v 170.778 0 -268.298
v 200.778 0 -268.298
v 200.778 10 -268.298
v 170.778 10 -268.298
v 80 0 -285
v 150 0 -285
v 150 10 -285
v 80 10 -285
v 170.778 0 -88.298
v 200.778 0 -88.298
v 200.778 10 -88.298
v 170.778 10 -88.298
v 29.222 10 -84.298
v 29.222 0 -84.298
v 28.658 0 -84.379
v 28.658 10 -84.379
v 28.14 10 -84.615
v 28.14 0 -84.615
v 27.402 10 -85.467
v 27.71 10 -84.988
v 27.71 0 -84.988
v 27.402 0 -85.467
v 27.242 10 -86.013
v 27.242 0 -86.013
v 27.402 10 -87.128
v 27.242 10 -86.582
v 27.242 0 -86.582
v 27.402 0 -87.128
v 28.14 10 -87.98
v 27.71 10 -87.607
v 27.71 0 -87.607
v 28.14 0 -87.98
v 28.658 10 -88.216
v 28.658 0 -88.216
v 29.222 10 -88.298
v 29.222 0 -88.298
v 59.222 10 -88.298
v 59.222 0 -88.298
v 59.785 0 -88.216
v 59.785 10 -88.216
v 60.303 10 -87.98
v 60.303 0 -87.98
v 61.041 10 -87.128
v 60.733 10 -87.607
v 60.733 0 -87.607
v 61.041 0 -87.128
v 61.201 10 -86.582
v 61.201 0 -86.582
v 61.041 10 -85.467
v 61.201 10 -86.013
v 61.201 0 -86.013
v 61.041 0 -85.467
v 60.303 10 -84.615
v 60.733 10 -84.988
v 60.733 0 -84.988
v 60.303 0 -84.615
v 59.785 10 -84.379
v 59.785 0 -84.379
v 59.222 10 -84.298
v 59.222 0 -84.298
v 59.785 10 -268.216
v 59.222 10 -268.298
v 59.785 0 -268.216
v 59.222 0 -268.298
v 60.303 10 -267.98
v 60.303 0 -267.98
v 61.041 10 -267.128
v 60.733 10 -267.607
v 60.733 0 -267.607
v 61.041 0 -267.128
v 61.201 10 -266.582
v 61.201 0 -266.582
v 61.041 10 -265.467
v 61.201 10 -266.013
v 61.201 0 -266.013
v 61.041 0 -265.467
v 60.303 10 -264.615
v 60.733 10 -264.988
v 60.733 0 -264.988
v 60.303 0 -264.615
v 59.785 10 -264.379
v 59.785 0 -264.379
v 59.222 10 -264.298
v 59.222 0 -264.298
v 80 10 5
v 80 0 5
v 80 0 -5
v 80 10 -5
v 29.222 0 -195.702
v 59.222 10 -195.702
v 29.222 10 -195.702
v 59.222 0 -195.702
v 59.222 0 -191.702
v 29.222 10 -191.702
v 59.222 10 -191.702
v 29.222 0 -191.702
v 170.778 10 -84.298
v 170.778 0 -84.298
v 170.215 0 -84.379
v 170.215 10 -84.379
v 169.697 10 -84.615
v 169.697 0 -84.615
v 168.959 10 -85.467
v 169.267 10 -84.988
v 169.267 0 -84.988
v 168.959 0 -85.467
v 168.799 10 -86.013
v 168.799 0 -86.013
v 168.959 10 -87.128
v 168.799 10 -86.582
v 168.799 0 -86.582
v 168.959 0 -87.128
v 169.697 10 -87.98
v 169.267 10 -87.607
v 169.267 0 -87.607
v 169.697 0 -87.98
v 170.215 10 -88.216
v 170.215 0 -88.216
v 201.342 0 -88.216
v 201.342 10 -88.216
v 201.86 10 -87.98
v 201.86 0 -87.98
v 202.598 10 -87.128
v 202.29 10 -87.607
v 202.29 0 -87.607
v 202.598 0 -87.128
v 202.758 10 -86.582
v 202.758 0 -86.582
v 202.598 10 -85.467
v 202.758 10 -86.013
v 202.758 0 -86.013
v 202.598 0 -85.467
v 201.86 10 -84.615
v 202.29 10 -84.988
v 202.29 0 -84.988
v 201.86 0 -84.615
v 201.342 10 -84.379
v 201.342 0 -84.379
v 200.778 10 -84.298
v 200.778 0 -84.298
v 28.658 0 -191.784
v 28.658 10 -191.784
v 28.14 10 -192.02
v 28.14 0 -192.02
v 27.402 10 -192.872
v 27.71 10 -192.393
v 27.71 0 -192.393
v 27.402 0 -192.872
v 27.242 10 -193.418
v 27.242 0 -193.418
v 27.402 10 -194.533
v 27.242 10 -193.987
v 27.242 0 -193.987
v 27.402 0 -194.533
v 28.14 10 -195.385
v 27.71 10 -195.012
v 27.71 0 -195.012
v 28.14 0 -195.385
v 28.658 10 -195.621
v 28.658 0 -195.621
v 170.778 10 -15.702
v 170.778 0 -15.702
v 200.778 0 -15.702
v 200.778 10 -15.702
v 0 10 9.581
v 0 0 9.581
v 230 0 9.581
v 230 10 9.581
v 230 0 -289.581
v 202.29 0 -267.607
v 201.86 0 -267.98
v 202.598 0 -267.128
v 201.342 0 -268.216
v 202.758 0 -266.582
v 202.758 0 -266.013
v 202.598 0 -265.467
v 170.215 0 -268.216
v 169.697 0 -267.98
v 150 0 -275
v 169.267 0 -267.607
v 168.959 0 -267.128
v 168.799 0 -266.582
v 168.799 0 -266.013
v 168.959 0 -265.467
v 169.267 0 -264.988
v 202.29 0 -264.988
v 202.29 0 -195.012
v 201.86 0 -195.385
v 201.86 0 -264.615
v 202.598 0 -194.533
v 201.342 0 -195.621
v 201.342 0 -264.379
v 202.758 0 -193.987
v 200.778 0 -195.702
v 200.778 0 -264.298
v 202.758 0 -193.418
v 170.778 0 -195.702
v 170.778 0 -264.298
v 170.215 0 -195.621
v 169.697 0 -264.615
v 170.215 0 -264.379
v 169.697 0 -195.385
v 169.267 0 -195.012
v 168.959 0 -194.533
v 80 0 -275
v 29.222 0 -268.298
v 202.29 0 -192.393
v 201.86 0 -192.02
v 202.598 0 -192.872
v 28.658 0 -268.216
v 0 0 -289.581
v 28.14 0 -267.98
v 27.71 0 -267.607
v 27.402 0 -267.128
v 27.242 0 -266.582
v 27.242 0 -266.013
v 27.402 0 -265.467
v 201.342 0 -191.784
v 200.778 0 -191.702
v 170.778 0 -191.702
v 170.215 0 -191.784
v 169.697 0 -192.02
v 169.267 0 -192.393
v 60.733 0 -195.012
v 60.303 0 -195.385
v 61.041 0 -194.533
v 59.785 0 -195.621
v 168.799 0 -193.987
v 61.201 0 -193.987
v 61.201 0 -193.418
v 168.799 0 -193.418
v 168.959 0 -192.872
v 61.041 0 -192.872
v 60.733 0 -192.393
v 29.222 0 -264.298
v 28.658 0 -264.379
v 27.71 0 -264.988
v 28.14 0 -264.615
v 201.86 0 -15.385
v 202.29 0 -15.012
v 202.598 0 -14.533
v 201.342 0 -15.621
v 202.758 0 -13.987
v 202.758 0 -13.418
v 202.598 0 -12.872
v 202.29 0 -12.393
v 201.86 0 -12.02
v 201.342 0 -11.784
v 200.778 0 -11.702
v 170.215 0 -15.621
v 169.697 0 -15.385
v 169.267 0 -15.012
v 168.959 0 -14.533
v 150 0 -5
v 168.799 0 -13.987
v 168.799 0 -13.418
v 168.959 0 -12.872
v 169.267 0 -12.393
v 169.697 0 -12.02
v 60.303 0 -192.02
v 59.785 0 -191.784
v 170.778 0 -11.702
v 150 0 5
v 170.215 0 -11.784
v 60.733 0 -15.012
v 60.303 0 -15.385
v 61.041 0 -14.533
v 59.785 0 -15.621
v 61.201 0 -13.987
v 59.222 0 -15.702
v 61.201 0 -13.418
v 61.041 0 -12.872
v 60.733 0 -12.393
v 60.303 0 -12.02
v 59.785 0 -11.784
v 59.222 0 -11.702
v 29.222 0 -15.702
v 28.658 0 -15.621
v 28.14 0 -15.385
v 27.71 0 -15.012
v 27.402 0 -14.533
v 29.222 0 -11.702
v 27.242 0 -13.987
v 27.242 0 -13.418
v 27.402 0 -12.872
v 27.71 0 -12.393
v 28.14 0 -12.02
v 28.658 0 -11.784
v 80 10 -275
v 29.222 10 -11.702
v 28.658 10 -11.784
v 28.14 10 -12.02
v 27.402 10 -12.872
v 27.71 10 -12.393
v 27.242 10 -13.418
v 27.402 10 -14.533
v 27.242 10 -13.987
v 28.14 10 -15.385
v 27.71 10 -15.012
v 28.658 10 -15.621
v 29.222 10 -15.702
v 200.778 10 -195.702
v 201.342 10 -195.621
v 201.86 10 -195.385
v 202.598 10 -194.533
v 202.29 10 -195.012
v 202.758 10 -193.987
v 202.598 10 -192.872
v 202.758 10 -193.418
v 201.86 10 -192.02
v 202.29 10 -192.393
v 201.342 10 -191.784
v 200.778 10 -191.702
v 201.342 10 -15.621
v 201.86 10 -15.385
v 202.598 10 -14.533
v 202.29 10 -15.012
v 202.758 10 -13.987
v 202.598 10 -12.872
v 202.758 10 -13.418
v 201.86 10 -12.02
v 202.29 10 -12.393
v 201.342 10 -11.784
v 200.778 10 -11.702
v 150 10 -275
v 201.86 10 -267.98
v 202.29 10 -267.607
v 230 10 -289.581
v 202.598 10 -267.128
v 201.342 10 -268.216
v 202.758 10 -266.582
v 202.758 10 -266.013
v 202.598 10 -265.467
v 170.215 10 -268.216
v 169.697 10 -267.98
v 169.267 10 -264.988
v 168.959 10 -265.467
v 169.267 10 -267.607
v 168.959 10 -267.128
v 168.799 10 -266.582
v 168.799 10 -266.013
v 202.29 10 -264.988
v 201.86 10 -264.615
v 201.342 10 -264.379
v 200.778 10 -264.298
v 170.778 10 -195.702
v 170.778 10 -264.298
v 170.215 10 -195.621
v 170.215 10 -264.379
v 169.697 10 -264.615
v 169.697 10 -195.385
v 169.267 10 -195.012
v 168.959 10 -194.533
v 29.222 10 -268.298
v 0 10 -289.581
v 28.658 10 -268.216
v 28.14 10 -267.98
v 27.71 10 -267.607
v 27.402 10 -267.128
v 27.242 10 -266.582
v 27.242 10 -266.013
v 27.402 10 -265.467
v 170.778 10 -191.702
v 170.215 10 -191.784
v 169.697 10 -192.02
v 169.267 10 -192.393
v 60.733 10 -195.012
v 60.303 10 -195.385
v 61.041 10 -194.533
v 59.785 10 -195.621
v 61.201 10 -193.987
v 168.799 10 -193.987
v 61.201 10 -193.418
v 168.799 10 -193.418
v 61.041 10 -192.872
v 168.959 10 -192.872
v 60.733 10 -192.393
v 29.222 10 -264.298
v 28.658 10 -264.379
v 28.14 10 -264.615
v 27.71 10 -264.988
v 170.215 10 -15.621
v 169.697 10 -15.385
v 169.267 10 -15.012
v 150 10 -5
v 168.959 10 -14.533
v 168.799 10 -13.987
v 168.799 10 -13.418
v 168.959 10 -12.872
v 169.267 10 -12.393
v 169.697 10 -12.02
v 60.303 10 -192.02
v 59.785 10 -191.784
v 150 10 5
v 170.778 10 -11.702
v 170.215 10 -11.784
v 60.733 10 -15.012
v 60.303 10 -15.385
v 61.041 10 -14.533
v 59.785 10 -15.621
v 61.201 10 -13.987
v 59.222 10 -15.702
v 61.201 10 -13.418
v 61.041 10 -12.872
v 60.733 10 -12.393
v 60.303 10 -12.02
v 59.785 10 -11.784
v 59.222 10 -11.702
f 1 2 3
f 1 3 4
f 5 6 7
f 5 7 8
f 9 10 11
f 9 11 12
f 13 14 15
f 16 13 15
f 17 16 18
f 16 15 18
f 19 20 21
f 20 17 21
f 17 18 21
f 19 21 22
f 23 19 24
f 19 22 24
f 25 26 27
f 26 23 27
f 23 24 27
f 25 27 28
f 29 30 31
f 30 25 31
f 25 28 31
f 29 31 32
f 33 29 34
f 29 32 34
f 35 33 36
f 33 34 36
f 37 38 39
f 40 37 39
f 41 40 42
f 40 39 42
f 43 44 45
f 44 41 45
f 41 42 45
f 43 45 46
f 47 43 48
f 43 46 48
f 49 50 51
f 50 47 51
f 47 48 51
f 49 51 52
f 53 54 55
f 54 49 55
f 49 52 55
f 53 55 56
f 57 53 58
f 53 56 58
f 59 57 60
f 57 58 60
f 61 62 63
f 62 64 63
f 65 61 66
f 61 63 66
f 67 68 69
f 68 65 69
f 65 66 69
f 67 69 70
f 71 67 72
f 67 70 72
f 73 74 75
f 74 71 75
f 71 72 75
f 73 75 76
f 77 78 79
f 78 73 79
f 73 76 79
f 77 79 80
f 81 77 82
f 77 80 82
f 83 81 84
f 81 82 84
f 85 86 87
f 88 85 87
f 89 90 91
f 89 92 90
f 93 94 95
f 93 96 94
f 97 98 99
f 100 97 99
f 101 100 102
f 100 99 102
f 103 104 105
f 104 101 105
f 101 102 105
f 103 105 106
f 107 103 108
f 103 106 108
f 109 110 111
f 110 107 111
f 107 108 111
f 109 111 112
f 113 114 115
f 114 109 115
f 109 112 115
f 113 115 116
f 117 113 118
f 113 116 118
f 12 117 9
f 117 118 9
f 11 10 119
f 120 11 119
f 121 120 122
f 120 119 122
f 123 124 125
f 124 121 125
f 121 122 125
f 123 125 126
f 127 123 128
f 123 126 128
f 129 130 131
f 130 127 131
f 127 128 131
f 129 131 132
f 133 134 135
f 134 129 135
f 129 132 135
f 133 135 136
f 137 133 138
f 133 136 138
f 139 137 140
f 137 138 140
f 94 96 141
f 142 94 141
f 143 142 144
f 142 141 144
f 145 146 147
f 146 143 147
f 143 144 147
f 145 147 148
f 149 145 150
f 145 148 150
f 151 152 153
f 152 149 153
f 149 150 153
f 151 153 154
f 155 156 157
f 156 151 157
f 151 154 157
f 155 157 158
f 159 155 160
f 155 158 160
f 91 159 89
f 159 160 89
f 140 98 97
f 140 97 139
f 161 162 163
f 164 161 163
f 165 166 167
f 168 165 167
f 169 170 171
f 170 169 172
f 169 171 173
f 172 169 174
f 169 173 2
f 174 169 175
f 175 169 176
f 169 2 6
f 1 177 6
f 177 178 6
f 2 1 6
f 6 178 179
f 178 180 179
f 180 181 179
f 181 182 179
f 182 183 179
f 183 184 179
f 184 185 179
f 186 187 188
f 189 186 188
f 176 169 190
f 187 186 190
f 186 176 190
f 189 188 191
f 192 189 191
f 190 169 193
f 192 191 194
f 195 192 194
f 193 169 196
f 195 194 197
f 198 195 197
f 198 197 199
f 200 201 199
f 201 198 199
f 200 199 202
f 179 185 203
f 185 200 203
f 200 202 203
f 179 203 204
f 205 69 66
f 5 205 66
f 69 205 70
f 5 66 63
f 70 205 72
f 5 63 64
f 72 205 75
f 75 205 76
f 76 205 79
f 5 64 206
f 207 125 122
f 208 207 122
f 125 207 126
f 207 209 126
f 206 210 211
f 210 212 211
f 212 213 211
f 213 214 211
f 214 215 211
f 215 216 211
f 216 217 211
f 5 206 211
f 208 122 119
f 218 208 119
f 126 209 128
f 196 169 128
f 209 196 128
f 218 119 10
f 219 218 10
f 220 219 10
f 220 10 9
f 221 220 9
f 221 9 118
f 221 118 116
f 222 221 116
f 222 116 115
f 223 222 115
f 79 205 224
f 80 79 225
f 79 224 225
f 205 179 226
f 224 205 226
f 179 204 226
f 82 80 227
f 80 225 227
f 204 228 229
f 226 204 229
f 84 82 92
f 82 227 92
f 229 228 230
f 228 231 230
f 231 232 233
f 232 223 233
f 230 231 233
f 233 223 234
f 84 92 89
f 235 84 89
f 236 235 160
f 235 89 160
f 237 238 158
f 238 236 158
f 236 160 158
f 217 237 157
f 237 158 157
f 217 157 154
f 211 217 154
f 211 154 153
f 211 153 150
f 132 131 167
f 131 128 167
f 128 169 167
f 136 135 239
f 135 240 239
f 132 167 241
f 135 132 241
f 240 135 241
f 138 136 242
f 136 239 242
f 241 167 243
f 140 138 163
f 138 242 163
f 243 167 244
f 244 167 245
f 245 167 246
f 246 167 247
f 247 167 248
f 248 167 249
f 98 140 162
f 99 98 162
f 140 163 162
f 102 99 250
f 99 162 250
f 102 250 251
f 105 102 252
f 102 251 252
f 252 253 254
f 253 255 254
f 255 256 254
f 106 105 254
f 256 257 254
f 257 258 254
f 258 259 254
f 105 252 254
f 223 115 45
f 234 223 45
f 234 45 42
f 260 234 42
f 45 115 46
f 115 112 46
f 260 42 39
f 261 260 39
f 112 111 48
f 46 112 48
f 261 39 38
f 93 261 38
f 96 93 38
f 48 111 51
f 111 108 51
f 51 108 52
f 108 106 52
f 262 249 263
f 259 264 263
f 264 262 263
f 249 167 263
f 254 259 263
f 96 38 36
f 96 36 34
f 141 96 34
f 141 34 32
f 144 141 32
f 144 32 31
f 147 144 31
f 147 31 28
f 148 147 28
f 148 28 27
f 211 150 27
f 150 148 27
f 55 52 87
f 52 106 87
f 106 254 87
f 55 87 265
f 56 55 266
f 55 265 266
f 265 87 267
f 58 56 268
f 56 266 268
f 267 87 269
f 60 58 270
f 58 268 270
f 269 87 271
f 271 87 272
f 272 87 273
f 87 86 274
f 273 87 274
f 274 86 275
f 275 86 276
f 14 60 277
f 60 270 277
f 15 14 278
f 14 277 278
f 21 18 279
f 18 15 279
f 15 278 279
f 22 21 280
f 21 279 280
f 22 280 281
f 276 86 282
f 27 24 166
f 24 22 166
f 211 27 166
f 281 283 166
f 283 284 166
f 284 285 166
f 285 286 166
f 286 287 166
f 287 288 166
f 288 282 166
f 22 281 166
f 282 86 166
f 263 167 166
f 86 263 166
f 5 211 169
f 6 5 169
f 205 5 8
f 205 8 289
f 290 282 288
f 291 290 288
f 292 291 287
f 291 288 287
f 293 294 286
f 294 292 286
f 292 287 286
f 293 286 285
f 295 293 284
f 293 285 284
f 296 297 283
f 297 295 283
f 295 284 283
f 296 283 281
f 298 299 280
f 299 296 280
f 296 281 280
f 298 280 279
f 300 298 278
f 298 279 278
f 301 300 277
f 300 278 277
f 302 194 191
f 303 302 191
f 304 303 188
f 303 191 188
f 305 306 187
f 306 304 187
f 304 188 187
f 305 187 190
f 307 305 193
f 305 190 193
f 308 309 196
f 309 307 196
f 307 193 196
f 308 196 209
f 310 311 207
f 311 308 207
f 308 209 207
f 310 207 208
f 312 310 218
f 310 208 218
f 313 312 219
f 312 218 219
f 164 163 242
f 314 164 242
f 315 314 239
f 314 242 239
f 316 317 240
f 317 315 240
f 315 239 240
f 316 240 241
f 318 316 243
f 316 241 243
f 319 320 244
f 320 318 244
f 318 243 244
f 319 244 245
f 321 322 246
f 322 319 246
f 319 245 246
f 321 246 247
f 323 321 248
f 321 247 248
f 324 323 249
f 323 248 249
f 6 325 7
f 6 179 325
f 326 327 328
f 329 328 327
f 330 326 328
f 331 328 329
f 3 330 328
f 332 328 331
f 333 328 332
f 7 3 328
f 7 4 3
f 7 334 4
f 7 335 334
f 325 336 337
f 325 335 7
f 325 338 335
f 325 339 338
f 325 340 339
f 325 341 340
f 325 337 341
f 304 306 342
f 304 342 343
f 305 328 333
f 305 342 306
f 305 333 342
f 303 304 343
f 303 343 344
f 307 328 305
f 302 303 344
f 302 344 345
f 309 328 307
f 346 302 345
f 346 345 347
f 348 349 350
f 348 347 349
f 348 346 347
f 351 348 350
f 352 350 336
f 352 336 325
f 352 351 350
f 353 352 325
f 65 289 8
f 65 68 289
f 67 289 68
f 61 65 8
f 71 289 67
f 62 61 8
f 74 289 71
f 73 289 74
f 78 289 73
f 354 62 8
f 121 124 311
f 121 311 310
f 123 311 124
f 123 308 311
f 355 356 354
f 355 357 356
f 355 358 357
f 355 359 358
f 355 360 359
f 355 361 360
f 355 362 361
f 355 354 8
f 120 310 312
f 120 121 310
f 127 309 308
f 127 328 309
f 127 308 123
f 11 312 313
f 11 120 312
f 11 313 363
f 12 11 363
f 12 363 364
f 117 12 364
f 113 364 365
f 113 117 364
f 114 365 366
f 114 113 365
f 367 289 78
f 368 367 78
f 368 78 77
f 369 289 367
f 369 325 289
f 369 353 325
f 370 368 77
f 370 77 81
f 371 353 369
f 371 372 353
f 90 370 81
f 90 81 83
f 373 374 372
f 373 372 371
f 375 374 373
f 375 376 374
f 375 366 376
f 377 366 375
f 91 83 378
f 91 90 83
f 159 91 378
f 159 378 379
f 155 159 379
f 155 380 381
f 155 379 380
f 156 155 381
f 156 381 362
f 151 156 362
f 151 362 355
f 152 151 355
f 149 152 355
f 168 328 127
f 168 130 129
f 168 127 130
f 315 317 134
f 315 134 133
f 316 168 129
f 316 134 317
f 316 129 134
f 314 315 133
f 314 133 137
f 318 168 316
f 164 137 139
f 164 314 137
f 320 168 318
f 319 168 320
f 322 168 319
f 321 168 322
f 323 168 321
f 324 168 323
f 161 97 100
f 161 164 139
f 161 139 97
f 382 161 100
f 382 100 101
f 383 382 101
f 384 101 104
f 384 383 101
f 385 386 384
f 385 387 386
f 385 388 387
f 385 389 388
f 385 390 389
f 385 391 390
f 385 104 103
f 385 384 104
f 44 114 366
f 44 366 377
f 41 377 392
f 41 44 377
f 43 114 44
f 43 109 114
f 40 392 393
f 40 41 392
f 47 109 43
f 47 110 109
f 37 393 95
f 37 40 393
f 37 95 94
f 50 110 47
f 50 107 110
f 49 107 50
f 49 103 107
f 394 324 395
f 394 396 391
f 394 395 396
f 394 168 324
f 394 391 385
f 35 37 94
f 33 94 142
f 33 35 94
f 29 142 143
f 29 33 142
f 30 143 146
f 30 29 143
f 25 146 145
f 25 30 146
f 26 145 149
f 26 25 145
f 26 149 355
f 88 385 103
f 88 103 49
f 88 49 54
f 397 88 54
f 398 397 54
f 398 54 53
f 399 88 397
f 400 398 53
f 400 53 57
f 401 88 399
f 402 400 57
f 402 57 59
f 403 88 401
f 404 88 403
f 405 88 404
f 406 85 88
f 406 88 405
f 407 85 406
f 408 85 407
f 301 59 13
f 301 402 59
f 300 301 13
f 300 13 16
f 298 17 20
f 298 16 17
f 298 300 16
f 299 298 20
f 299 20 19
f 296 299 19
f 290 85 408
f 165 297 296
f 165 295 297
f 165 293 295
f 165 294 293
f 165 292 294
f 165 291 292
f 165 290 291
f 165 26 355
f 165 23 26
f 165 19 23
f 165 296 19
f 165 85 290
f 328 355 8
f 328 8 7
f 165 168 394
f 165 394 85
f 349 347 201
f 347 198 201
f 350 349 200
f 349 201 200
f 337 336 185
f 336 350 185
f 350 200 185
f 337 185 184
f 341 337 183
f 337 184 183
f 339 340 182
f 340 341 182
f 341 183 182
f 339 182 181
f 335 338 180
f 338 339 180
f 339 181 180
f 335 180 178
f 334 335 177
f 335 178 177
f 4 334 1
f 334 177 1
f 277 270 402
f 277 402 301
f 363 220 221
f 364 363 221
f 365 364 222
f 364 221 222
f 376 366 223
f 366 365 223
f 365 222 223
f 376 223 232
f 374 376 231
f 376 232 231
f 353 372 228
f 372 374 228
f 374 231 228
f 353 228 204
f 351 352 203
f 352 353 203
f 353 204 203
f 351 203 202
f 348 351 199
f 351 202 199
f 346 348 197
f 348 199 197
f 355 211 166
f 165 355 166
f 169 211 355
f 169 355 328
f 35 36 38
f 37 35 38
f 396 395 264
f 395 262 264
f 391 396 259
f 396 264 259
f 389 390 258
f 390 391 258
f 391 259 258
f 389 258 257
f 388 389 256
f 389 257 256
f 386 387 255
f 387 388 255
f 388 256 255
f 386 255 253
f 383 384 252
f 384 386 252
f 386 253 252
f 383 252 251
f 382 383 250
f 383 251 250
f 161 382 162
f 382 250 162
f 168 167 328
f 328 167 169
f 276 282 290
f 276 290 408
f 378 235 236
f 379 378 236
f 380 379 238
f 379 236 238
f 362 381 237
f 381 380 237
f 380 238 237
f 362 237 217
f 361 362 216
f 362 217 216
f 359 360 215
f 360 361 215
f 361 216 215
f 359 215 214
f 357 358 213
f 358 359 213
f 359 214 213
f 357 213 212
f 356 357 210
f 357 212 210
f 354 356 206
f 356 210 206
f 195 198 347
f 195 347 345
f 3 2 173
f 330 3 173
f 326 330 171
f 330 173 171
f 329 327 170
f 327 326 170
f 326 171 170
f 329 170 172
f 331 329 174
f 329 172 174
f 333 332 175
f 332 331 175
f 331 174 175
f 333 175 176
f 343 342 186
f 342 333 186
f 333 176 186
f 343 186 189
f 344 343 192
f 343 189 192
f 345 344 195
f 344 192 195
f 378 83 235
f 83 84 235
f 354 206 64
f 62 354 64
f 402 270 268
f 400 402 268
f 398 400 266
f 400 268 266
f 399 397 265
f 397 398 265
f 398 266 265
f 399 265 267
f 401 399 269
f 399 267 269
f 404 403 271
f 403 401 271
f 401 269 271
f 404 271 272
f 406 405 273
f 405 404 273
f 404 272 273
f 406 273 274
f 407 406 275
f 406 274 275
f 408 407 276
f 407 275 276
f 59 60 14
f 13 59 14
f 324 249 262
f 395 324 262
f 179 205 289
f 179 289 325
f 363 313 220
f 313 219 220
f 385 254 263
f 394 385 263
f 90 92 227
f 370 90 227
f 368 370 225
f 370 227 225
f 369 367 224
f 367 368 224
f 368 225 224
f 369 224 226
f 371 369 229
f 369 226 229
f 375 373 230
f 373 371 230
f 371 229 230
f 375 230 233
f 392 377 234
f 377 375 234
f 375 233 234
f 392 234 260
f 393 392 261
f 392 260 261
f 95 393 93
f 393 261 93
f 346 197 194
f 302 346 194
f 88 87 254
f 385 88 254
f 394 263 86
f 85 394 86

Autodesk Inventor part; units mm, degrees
ref_plane "YZ Plane" through (0, 0, 0) normal (1, 0, 0) x (0, 1, 0)
ref_plane "XZ Plane" through (0, 0, 0) normal (0, 1, 0) x (-1, 0, 0)
ref_plane "XY Plane" through (0, 0, 0) normal (0, 0, 1) x (1, 0, 0)
sketch "Sketch1" plane through (0, 0, 0) normal (0, 1, 0) x (-1, 0, 0)
  line L0 (-230, 0) -> (-230, -280)
  line L1 (0, -280) -> (0, 0)
  line L2 (-115, 0) -> (-115, -280) construction
  line L3 (-230, -140) -> (0, -140) construction
  line L4 (0, -230) -> (-230, -230) construction
  line L5 (0, -28.043) -> (0, -96.333) construction
  line L6 (0, -69) -> (0, -31) construction
  line L7 (0, -50) -> (-230, -50) construction
  line L8 (0, -31) -> (-80, -31) construction
  line L9 (-80, -31) -> (-80, -69) construction
  line L10 (-80, -69) -> (0, -69) construction
  line L11 (0, -69) -> (0, -31)
  line L12 (-40, -50) -> (-40, -10.0475) construction
  line L13 (-40, -13.7025) -> (-29.2216, -13.7025)
  line L14 (-40, -13.7025) -> (-59.2216, -13.7025)
  line L15 (-29.2216, -13.7025) -> (-59.2216, -13.7025) construction
  line L16 (-29.2216, -11.7025) -> (-59.2216, -11.7025)
  line L17 (-59.2216, -15.7025) -> (-29.2216, -15.7025)
  arc A0 (-29.2216, -15.7025) -> (-29.2216, -11.7025) centre (-29.2216, -13.7025) ccw
  arc A1 (-59.2216, -11.7025) -> (-59.2216, -15.7025) centre (-59.2216, -13.7025) ccw
  line L18 (-40, -86.2975) -> (-29.2216, -86.2975)
  line L19 (-40, -86.2975) -> (-59.2216, -86.2975)
  line L20 (-29.2216, -86.2975) -> (-59.2216, -86.2975) construction
  line L21 (-29.2216, -88.2975) -> (-59.2216, -88.2975)
  line L22 (-59.2216, -84.2975) -> (-29.2216, -84.2975)
  arc A2 (-29.2216, -88.2975) -> (-29.2216, -84.2975) centre (-29.2216, -86.2975) ccw
  arc A3 (-59.2216, -84.2975) -> (-59.2216, -88.2975) centre (-59.2216, -86.2975) ccw
  line L23 (-230, -31) -> (-150, -31) construction
  line L24 (-150, -31) -> (-150, -69) construction
  line L25 (-150, -69) -> (-230, -69) construction
  line L26 (-190, -13.7025) -> (-200.7784, -13.7025)
  line L27 (-190, -13.7025) -> (-170.7784, -13.7025)
  line L28 (-200.7784, -13.7025) -> (-170.7784, -13.7025) construction
  line L29 (-200.7784, -11.7025) -> (-170.7784, -11.7025)
  line L30 (-170.7784, -15.7025) -> (-200.7784, -15.7025)
  arc A4 (-200.7784, -11.7025) -> (-200.7784, -15.7025) centre (-200.7784, -13.7025) ccw
  arc A5 (-170.7784, -15.7025) -> (-170.7784, -11.7025) centre (-170.7784, -13.7025) ccw
  arc A6 (-170.7784, -88.2975) -> (-170.7784, -84.2975) centre (-170.7784, -86.2975) ccw
  line L31 (-190, -86.2975) -> (-170.7784, -86.2975)
  line L32 (-170.7784, -84.2975) -> (-200.7784, -84.2975)
  line L33 (-190, -86.2975) -> (-200.7784, -86.2975)
  line L34 (-200.7784, -86.2975) -> (-170.7784, -86.2975) construction
  line L35 (-200.7784, -88.2975) -> (-170.7784, -88.2975)
  arc A7 (-200.7784, -84.2975) -> (-200.7784, -88.2975) centre (-200.7784, -86.2975) ccw
  line L36 (-115, -280) -> (-115, 0) construction
  line L37 (0, -230) -> (-230, -230) construction
  line L38 (0, -249) -> (-80, -249) construction
  line L39 (-80, -249) -> (-80, -211) construction
  line L40 (-80, -211) -> (0, -211) construction
  line L41 (-40, -230) -> (-40, -269.9525) construction
  line L42 (-40, -266.2975) -> (-29.2216, -266.2975)
  line L43 (-40, -266.2975) -> (-59.2216, -266.2975)
  line L44 (-29.2216, -266.2975) -> (-59.2216, -266.2975) construction
  line L45 (-29.2216, -268.2975) -> (-59.2216, -268.2975)
  line L46 (-59.2216, -264.2975) -> (-29.2216, -264.2975)
  arc A8 (-29.2216, -268.2975) -> (-29.2216, -264.2975) centre (-29.2216, -266.2975) ccw
  arc A9 (-59.2216, -264.2975) -> (-59.2216, -268.2975) centre (-59.2216, -266.2975) ccw
  arc A10 (-59.2216, -191.7025) -> (-59.2216, -195.7025) centre (-59.2216, -193.7025) ccw
  line L47 (-40, -193.7025) -> (-59.2216, -193.7025)
  line L48 (-59.2216, -195.7025) -> (-29.2216, -195.7025)
  line L49 (-40, -193.7025) -> (-29.2216, -193.7025)
  line L50 (-29.2216, -193.7025) -> (-59.2216, -193.7025) construction
  line L51 (-29.2216, -191.7025) -> (-59.2216, -191.7025)
  arc A11 (-29.2216, -195.7025) -> (-29.2216, -191.7025) centre (-29.2216, -193.7025) ccw
  line L52 (-150, -249) -> (-150, -211) construction
  line L53 (-170.7784, -264.2975) -> (-200.7784, -264.2975)
  line L54 (-190, -266.2975) -> (-200.7784, -266.2975)
  line L55 (-190, -266.2975) -> (-170.7784, -266.2975)
  arc A12 (-200.7784, -264.2975) -> (-200.7784, -268.2975) centre (-200.7784, -266.2975) ccw
  line L56 (-200.7784, -268.2975) -> (-170.7784, -268.2975)
  arc A13 (-170.7784, -268.2975) -> (-170.7784, -264.2975) centre (-170.7784, -266.2975) ccw
  line L57 (-200.7784, -266.2975) -> (-170.7784, -266.2975) construction
  line L58 (-170.7784, -195.7025) -> (-200.7784, -195.7025)
  line L59 (-190, -193.7025) -> (-200.7784, -193.7025)
  arc A14 (-200.7784, -191.7025) -> (-200.7784, -195.7025) centre (-200.7784, -193.7025) ccw
  line L60 (-200.7784, -193.7025) -> (-170.7784, -193.7025) construction
  line L61 (-200.7784, -191.7025) -> (-170.7784, -191.7025)
  line L62 (-190, -193.7025) -> (-170.7784, -193.7025)
  arc A15 (-170.7784, -195.7025) -> (-170.7784, -191.7025) centre (-170.7784, -193.7025) ccw
  line L63 (-150, -211) -> (-230, -211) construction
  line L64 (-230, -249) -> (-150, -249) construction
  line L65 (-192.5048, 9.5806) -> (-30, 9.5806)
  line L66 (-192.5048, -289.5806) -> (-30, -289.5806)
  line L67 (-80, -5) -> (-150, -5)
  line L68 (-150, -5) -> (-150, 5)
  line L69 (-150, 5) -> (-80, 5)
  line L70 (-80, 5) -> (-80, -5)
  line L71 (-80, -275) -> (-150, -275)
  line L72 (-150, -275) -> (-150, -285)
  line L73 (-150, -285) -> (-80, -285)
  line L74 (-80, -285) -> (-80, -275)
  line L75 (0, 0) -> (0, 9.5806)
  line L76 (0, 9.5806) -> (-30, 9.5806)
  line L77 (-192.5048, 9.5806) -> (-230, 9.5806)
  line L78 (-230, 9.5806) -> (-230, 0)
  line L79 (0, -280) -> (0, -289.5806)
  line L80 (0, -289.5806) -> (-30, -289.5806)
  line L81 (-192.5048, -289.5806) -> (-230, -289.5806)
  line L82 (-230, -289.5806) -> (-230, -280)
  point P0 (-40, -31)
  point P1 (-44.2216, -13.7025)
  point P2 (-44.2216, -86.2975)
  point P3 (-190, -50)
  point P4 (-190, -31)
  point P5 (-185.7784, -13.7025)
  point P6 (-185.7784, -86.2975)
  point P7 (-40, -249)
  point P8 (-44.2216, -266.2975)
  point P9 (-44.2216, -193.7025)
  point P10 (-190, -230)
  point P11 (-190, -249)
  point P12 (-185.7784, -193.7025)
  point P13 (-185.7784, -266.2975)
  point P14 (-115, -5)
  point P15 (-44.2216, -86.2975)
  point P16 (-44.2216, -193.7025)
  point P17 (-115, -280)
  point P18 (-115, -280)
  point P19 (-115, -275)
  dimension "d0" = 230
  dimension "d15" = 80
  dimension "d25" = 4
  dimension "d33" = 72.595
  dimension "d34" = 30
  dimension "d35" = 107.405
  dimension "d36" = 280
extrude "Extrusion1" add sketch "Sketch1" along normal blind 10 contours L78 L77 L65 L76 L75 L1 L79 L80 L66 L81 L82 L0 | A0 L17 A1 L16 | L21 A3 L22 A2 | L29 A5 L30 A4 | L35 A7 L32 A6 | L45 A9 L46 A8 | L51 A11 L48 A10 | A13 L56 A12 L53 | L58 A14 L61 A15 | L67 L68 L69 L70 | L74 L73 L72 L71
extrude "Extrusion2" cut sketch "Sketch1" along normal through all contours A0 L17 A1 L16 | L21 A3 L22 A2 | L29 A5 L30 A4 | L35 A7 L32 A6 | L45 A9 L46 A8 | L51 A11 L48 A10 | A13 L56 A12 L53 | L58 A14 L61 A15
extrude "Extrusion4" add sketch "Sketch1" along normal blind 10 contours L78 L77 L65 L76 L75 L1 L79 L80 L66 L81 L82 L0 | A0 L17 A1 L16 | L21 A3 L22 A2 | L29 A5 L30 A4 | L35 A7 L32 A6 | L45 A9 L46 A8 | L51 A11 L48 A10 | A13 L56 A12 L53 | L58 A14 L61 A15 | L67 L68 L69 L70 | L74 L73 L72 L71
extrude "Extrusion5" cut sketch "Sketch1" along normal blind 10 contours L67 L68 L69 L70 | L74 L73 L72 L71
extrude "Extrusion6" cut sketch "Sketch1" along normal blind 10 contours L29 A5 L30 A4
extrude "Extrusion7" cut sketch "Sketch1" along normal blind 10 contours A0 L17 A1 L16 | L21 A3 L22 A2 | L35 A7 L32 A6 | L45 A9 L46 A8 | L51 A11 L48 A10 | A13 L56 A12 L53 | L58 A14 L61 A15
properties part number "base"
